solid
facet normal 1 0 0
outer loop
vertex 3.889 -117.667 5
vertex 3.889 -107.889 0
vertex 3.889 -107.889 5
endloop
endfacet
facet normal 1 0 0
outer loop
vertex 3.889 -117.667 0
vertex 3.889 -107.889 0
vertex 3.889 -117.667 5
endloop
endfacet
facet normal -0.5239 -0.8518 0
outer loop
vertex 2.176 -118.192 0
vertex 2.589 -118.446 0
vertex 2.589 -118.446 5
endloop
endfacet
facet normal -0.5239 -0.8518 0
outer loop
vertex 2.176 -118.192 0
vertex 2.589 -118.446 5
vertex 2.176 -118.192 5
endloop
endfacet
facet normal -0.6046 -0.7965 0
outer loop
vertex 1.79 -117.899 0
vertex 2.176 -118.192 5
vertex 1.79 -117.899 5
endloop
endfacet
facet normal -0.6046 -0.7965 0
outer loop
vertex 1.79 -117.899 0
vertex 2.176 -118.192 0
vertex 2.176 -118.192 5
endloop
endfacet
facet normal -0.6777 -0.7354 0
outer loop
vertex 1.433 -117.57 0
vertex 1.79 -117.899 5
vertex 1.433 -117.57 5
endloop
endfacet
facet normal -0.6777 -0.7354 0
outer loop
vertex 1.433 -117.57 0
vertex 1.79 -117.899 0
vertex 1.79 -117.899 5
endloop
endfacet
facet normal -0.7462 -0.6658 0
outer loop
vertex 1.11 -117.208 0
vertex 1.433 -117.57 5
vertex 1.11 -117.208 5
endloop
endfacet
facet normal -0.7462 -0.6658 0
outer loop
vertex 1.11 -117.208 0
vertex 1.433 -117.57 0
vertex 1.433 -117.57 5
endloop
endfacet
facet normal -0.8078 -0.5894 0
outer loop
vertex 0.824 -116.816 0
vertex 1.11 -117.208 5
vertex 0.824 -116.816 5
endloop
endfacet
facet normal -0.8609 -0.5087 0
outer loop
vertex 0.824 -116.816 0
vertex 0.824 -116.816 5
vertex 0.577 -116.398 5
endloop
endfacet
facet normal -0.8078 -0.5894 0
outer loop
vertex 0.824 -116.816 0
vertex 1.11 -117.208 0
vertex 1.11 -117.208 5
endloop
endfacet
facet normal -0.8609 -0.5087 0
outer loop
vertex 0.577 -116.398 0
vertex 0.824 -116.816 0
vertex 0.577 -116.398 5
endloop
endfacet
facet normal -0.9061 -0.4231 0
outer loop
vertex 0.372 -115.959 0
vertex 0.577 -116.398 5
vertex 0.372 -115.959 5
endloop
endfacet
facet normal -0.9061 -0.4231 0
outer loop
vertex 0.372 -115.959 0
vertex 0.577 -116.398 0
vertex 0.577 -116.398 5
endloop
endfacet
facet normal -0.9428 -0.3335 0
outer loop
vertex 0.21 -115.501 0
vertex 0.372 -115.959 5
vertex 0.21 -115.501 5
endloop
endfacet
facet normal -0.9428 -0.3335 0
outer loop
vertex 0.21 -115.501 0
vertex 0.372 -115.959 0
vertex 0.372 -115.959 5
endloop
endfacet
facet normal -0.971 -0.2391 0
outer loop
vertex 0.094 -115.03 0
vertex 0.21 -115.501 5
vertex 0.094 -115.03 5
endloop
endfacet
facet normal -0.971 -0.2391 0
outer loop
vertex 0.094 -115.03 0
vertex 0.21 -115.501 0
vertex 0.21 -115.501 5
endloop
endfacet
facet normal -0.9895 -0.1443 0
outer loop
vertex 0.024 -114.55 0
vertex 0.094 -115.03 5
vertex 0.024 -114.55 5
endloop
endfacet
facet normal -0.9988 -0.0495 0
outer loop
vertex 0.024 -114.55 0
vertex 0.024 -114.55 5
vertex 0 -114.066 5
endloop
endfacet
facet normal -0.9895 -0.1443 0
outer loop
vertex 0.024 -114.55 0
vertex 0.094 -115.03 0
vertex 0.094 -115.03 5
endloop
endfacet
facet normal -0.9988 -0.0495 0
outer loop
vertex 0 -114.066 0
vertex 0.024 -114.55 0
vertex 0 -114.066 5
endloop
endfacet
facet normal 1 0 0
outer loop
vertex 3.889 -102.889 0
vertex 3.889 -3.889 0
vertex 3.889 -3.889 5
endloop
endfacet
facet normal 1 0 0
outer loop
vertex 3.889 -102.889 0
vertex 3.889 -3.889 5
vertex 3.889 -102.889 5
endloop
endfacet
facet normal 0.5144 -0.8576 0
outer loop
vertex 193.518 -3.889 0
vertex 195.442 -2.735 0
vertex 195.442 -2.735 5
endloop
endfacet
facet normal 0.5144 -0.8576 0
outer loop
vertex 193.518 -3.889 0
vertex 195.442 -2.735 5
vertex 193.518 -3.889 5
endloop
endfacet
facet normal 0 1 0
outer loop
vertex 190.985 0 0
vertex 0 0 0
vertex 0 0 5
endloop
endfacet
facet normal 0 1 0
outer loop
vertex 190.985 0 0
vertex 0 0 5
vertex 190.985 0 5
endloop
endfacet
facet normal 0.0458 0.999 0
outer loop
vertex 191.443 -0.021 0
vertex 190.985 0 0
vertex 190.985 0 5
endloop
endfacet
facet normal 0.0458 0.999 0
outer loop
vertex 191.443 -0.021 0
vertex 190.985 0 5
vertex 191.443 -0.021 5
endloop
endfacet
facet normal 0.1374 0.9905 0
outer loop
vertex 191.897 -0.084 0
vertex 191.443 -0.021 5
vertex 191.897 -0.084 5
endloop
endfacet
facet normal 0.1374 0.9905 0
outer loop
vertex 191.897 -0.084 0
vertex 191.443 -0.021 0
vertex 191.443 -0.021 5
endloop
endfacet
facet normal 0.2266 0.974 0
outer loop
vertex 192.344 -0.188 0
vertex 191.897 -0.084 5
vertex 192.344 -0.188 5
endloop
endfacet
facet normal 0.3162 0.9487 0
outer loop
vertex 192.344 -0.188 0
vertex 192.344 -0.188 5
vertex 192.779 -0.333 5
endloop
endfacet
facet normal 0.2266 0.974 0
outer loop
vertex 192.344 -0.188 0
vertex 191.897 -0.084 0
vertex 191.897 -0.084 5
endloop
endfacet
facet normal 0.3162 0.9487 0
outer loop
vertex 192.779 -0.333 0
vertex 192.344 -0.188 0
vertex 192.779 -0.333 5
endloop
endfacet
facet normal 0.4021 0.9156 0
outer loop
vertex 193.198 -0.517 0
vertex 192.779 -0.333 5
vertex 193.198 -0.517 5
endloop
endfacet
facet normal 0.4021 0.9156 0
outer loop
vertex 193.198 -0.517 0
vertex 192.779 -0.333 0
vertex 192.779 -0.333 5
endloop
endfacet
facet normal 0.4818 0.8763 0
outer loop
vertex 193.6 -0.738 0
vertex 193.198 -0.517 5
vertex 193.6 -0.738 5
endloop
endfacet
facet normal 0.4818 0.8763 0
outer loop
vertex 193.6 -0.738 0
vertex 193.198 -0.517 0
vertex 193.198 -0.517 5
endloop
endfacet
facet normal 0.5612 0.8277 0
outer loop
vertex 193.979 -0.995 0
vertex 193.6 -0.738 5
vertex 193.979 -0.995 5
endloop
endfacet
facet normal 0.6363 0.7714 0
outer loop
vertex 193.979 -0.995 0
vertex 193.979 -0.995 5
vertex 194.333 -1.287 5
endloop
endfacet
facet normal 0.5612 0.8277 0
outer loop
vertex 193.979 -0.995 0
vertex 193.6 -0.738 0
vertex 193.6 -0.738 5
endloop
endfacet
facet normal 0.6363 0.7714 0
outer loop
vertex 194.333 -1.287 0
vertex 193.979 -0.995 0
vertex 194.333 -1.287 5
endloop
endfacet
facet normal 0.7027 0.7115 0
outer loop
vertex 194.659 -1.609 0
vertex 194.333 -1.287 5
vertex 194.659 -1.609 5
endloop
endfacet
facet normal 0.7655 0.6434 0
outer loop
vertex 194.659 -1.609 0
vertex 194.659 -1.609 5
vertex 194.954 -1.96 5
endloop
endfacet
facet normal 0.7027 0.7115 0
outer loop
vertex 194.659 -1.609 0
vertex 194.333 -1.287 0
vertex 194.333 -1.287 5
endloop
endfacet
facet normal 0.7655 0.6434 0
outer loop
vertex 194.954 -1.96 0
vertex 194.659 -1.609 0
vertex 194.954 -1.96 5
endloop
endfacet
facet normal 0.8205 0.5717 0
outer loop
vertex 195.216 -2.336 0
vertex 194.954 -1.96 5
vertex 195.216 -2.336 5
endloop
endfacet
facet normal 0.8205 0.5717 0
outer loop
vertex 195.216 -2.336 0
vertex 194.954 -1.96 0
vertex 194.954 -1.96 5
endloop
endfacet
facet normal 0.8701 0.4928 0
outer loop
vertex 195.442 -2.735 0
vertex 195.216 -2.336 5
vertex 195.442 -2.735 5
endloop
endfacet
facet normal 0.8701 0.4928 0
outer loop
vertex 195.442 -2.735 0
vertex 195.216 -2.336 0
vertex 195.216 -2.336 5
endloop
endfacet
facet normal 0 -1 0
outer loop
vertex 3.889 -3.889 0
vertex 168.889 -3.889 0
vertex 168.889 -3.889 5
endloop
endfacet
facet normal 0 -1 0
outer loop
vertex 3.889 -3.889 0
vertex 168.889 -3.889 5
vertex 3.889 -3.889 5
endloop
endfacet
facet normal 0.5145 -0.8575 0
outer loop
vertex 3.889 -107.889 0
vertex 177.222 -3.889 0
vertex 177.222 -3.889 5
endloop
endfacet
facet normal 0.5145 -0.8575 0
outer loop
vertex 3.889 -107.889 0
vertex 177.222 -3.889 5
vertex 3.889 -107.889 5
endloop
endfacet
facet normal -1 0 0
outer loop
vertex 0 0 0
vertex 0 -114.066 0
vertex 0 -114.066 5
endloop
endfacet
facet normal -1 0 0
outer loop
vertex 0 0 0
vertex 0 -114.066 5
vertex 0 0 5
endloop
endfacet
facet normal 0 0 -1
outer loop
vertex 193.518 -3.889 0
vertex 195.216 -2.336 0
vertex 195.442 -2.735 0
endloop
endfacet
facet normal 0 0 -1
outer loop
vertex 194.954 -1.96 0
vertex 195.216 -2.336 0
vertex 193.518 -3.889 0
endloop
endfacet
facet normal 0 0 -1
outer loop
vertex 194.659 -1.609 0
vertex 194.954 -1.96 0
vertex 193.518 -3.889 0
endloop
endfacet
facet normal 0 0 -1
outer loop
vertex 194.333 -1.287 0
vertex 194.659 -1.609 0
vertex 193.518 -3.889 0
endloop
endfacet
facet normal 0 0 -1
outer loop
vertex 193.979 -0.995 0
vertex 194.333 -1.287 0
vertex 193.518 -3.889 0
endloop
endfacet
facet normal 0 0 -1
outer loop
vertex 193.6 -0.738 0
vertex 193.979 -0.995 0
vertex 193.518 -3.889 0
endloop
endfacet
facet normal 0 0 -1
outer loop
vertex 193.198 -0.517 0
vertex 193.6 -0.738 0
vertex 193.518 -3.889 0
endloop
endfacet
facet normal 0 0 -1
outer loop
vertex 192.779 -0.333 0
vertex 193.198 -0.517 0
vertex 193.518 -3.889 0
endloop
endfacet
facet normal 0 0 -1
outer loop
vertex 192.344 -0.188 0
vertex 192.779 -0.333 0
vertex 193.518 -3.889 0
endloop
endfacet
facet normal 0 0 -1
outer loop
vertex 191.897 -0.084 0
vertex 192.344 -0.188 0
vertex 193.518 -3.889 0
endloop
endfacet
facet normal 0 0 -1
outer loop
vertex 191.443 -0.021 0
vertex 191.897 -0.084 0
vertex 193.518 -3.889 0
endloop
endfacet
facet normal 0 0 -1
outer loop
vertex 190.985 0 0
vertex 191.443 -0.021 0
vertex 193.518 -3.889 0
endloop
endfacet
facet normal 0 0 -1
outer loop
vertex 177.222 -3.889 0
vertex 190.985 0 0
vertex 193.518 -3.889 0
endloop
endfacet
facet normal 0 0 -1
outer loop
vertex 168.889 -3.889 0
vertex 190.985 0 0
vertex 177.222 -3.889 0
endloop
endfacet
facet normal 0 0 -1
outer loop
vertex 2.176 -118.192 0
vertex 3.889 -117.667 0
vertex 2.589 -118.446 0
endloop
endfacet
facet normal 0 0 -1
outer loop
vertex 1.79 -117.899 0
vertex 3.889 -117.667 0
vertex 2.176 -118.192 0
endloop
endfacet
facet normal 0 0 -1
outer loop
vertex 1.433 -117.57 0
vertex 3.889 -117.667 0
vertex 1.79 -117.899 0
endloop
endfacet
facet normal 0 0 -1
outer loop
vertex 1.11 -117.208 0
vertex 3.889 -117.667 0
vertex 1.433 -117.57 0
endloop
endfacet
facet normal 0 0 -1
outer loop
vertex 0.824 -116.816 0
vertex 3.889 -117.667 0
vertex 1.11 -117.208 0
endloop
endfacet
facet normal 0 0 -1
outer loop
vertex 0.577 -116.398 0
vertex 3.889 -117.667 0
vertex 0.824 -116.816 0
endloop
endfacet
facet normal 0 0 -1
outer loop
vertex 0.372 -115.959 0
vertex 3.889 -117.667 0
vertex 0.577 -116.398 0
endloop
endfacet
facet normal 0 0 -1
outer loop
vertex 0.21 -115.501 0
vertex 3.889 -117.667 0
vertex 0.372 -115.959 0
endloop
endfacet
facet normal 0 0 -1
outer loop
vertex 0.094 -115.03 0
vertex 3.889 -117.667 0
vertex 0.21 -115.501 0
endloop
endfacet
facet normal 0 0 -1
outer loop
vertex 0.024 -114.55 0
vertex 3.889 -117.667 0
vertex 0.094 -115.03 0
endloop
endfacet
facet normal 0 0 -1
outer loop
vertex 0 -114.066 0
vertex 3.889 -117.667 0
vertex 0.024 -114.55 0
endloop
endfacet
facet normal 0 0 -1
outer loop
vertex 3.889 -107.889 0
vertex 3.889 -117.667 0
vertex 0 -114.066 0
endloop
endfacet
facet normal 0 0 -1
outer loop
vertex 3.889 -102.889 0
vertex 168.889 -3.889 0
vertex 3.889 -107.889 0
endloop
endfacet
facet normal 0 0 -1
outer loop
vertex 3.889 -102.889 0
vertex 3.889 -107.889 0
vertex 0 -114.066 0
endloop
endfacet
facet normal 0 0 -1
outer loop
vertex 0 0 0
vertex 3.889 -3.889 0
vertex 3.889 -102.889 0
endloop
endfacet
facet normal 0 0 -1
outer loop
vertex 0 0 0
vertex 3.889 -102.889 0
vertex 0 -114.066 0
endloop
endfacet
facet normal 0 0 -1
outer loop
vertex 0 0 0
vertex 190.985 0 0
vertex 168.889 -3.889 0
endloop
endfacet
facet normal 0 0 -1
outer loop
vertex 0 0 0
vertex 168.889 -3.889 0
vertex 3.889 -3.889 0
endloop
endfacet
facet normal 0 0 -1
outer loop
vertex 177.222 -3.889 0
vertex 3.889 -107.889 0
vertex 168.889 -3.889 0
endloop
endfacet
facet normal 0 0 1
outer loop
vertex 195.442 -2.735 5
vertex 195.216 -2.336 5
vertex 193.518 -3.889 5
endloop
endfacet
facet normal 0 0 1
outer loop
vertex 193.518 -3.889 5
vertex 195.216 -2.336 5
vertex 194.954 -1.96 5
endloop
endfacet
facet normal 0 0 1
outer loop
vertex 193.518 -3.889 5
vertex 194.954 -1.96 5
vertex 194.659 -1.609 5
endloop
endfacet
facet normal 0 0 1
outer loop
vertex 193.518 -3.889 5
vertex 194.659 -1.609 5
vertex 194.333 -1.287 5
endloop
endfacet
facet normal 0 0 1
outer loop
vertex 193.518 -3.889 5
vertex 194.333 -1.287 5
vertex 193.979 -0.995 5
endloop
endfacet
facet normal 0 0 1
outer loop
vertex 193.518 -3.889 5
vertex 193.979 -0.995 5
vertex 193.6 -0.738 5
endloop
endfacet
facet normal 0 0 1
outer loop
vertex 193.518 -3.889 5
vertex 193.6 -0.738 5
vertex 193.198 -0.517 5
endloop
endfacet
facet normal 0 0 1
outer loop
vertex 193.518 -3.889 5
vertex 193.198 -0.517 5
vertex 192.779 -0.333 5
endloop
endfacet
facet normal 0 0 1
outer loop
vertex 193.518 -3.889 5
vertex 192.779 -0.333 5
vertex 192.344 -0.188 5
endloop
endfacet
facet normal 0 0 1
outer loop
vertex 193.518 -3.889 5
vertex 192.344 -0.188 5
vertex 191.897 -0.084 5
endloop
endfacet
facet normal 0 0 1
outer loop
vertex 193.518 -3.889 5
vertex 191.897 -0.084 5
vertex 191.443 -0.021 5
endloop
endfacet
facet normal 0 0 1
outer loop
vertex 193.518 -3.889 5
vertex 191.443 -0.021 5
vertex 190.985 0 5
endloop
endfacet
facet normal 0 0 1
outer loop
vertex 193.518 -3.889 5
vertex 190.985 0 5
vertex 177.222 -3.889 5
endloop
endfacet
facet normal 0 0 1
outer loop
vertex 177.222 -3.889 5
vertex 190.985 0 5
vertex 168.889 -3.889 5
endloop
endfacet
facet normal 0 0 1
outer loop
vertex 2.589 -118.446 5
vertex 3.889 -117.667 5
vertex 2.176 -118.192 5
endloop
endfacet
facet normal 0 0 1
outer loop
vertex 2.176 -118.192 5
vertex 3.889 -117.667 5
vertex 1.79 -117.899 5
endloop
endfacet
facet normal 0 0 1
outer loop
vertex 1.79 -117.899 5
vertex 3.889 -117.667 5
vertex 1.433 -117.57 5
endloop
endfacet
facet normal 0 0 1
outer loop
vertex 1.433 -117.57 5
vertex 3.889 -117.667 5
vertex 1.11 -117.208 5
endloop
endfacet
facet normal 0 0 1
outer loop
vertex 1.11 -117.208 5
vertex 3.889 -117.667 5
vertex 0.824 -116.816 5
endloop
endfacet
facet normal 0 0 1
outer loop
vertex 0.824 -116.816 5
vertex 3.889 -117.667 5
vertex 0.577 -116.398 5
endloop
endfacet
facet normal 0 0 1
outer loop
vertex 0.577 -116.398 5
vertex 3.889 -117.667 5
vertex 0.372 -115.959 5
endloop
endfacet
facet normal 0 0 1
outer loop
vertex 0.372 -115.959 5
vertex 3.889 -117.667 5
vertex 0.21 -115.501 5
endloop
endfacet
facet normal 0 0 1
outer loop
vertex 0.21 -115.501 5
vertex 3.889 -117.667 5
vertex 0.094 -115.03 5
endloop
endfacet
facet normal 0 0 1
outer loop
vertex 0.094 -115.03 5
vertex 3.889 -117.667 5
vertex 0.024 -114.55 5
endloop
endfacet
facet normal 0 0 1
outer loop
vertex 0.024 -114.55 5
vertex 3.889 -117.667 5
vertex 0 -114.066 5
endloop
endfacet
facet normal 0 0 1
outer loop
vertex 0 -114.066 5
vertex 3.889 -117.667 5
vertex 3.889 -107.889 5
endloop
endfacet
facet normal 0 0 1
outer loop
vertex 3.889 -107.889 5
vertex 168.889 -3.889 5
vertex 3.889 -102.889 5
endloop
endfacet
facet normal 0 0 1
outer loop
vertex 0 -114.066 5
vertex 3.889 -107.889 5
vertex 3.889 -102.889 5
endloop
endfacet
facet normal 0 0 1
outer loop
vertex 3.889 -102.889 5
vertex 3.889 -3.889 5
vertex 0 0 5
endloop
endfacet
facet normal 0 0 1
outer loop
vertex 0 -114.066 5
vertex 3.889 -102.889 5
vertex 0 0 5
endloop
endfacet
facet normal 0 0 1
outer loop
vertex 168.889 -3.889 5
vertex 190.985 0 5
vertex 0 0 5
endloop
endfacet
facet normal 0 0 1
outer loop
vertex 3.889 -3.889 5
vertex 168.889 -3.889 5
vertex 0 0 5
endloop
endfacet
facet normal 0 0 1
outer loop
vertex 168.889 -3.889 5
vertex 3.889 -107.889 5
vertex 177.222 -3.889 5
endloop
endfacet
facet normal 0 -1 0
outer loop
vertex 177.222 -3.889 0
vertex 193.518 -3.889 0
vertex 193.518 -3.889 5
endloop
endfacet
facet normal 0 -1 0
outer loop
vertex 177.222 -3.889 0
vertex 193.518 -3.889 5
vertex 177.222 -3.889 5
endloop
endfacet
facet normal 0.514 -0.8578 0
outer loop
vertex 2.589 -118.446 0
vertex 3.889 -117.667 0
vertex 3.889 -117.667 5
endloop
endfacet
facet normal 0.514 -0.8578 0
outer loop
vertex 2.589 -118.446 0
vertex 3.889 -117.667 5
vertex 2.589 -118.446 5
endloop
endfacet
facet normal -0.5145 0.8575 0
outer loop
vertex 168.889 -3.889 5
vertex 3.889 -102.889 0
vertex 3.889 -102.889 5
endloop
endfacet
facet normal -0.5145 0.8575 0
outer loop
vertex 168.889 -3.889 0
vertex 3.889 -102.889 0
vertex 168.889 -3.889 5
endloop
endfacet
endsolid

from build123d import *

# Parameters (mm, degrees)
BOSS_EXTRU_4_DEPTH = 5


with BuildPart() as part:
    # Esquisse1 → Boss.-Extru.4 (new body)
    with BuildSketch(Plane.XY):
        with BuildLine():
            Line((0, 0), (190.985155098, 0))
            ThreePointArc((190.985155098, 0), (193.599787646, -0.738111142), (195.442464428, -2.734521343))
            Line((195.442464428, -2.734521343), (193.518187839, -3.889087297))
            Line((193.518187839, -3.889087297), (177.22242063, -3.889087297))
            Line((177.22242063, -3.889087297), (3.889087297, -107.889087297))
            Line((3.889087297, -107.889087297), (3.889087297, -117.666547622))
            Line((3.889087297, -117.666547622), (2.58933145, -118.44640113))
            ThreePointArc((2.58933145, -118.44640113), (0.695737999, -116.610186592), (0, -114.065912899))
            Line((0, -114.065912899), (0, 0))
        make_face()
        Polygon((3.889087297, -102.889087297), (168.889087297, -3.889087297), (3.889087297, -3.889087297), align=None, mode=Mode.SUBTRACT)
    extrude(amount=BOSS_EXTRU_4_DEPTH)


solid = part.part
